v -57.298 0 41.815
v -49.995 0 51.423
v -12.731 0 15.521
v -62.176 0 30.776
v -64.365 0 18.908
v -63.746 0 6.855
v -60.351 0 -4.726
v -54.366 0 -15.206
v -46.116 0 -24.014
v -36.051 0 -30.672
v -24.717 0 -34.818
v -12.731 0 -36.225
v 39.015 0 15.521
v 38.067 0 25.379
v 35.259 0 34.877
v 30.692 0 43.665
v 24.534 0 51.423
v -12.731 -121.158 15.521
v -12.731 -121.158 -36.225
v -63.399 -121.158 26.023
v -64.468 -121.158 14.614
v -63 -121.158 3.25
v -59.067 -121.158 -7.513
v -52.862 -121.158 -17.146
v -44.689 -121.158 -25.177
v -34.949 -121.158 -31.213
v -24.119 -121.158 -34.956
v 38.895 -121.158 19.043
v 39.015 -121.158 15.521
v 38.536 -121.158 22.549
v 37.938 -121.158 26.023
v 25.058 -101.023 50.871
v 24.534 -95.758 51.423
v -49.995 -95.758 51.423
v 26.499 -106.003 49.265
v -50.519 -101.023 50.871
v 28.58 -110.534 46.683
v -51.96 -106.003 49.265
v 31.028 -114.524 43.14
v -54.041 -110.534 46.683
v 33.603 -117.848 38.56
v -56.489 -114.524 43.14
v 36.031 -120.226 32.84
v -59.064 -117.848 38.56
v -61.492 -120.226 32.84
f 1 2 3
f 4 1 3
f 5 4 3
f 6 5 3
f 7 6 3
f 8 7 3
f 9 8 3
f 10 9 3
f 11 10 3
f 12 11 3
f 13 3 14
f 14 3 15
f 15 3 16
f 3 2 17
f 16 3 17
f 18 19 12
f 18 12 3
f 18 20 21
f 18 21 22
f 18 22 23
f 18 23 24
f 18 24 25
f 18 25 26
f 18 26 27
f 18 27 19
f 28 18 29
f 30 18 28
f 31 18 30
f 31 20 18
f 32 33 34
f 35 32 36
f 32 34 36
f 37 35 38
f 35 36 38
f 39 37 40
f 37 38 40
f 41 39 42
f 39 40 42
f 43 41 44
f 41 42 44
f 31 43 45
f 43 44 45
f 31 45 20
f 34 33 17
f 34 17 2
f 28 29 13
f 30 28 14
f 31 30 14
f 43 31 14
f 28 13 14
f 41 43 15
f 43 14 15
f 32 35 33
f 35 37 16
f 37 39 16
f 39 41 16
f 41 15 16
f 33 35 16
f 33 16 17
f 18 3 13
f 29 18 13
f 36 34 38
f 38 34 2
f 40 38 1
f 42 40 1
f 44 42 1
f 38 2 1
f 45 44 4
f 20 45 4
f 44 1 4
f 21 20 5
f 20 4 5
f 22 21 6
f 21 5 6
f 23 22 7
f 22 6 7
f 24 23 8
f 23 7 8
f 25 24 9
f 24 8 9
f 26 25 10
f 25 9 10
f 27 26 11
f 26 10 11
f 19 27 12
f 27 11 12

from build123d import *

# Parameters (mm, degrees)
F1_DEPTH = 121.158
F2_R     = 25.4


with BuildPart() as f1:
    # F0 (on Front) → F1 (new body)
    with BuildSketch(Plane.XZ):
        with BuildLine():
            Line((24.5343538996, 51.4227636158), (-49.995383161, 51.4227636158))
            ThreePointArc((-49.995383161, 51.4227636158), (-60.3509792514, -4.7259186533), (-12.7305146307, -36.2251922997))
            Line((-12.7305146307, -36.2251922997), (-12.7305146307, 15.5206499621))
            Line((-12.7305146307, 15.5206499621), (39.0153276312, 15.5206499621))
            ThreePointArc((39.0153276312, 15.5206499621), (35.2587247896, 34.876917455), (24.5343538996, 51.4227636158))
        make_face()
    extrude(amount=F1_DEPTH)

    # F2
    f2_edges = [f1.edges().sort_by_distance(p)[0] for p in [
        (-12.730515, -121.158, 51.422764),
    ]]
    fillet(f2_edges, radius=F2_R)


solid = f1.part
